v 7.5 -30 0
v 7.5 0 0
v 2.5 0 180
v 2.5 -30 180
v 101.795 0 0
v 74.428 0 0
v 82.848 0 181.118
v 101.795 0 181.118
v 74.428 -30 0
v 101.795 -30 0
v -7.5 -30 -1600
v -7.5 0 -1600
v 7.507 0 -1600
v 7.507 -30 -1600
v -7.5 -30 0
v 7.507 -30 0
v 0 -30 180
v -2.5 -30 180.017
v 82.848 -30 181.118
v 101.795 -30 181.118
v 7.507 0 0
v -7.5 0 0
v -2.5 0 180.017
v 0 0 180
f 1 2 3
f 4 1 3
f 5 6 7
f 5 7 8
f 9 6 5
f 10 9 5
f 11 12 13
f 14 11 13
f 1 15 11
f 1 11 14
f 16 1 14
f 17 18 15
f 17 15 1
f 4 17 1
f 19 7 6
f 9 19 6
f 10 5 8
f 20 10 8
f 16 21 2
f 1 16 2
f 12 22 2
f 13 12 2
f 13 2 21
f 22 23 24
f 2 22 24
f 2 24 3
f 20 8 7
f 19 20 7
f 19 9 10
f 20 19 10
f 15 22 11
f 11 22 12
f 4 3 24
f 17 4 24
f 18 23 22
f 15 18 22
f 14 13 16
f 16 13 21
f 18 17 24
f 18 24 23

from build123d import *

# Parameters (mm, degrees)
F1_DEPTH = 30
F3_DEPTH = 30


with BuildPart() as f1:
    # F0 (on Front) → F1 (new body)
    with BuildSketch(Plane.XZ):
        Polygon((-7.5, 0), (0, 0), (0, 180), (-2.499944, 180.016729), align=None)
        Polygon((0, 180), (0, 0), (7.5, 0), (2.5, 180), align=None)
        Polygon((7.5, 0), (0, 0), (-7.5, 0), (-7.5, -1600), (7.507107, -1600), (7.507107, 0), align=None)
    extrude(amount=F1_DEPTH)


with BuildPart() as f3:
    # F2 (on Front) → F3 (new body)
    with BuildSketch(Plane.XZ):
        Polygon((82.848303, 181.117684), (74.427694, 0), (101.794675, 0), (101.794675, 181.117684), align=None)
    extrude(amount=F3_DEPTH)


solid = Compound([f1.part, f3.part])
